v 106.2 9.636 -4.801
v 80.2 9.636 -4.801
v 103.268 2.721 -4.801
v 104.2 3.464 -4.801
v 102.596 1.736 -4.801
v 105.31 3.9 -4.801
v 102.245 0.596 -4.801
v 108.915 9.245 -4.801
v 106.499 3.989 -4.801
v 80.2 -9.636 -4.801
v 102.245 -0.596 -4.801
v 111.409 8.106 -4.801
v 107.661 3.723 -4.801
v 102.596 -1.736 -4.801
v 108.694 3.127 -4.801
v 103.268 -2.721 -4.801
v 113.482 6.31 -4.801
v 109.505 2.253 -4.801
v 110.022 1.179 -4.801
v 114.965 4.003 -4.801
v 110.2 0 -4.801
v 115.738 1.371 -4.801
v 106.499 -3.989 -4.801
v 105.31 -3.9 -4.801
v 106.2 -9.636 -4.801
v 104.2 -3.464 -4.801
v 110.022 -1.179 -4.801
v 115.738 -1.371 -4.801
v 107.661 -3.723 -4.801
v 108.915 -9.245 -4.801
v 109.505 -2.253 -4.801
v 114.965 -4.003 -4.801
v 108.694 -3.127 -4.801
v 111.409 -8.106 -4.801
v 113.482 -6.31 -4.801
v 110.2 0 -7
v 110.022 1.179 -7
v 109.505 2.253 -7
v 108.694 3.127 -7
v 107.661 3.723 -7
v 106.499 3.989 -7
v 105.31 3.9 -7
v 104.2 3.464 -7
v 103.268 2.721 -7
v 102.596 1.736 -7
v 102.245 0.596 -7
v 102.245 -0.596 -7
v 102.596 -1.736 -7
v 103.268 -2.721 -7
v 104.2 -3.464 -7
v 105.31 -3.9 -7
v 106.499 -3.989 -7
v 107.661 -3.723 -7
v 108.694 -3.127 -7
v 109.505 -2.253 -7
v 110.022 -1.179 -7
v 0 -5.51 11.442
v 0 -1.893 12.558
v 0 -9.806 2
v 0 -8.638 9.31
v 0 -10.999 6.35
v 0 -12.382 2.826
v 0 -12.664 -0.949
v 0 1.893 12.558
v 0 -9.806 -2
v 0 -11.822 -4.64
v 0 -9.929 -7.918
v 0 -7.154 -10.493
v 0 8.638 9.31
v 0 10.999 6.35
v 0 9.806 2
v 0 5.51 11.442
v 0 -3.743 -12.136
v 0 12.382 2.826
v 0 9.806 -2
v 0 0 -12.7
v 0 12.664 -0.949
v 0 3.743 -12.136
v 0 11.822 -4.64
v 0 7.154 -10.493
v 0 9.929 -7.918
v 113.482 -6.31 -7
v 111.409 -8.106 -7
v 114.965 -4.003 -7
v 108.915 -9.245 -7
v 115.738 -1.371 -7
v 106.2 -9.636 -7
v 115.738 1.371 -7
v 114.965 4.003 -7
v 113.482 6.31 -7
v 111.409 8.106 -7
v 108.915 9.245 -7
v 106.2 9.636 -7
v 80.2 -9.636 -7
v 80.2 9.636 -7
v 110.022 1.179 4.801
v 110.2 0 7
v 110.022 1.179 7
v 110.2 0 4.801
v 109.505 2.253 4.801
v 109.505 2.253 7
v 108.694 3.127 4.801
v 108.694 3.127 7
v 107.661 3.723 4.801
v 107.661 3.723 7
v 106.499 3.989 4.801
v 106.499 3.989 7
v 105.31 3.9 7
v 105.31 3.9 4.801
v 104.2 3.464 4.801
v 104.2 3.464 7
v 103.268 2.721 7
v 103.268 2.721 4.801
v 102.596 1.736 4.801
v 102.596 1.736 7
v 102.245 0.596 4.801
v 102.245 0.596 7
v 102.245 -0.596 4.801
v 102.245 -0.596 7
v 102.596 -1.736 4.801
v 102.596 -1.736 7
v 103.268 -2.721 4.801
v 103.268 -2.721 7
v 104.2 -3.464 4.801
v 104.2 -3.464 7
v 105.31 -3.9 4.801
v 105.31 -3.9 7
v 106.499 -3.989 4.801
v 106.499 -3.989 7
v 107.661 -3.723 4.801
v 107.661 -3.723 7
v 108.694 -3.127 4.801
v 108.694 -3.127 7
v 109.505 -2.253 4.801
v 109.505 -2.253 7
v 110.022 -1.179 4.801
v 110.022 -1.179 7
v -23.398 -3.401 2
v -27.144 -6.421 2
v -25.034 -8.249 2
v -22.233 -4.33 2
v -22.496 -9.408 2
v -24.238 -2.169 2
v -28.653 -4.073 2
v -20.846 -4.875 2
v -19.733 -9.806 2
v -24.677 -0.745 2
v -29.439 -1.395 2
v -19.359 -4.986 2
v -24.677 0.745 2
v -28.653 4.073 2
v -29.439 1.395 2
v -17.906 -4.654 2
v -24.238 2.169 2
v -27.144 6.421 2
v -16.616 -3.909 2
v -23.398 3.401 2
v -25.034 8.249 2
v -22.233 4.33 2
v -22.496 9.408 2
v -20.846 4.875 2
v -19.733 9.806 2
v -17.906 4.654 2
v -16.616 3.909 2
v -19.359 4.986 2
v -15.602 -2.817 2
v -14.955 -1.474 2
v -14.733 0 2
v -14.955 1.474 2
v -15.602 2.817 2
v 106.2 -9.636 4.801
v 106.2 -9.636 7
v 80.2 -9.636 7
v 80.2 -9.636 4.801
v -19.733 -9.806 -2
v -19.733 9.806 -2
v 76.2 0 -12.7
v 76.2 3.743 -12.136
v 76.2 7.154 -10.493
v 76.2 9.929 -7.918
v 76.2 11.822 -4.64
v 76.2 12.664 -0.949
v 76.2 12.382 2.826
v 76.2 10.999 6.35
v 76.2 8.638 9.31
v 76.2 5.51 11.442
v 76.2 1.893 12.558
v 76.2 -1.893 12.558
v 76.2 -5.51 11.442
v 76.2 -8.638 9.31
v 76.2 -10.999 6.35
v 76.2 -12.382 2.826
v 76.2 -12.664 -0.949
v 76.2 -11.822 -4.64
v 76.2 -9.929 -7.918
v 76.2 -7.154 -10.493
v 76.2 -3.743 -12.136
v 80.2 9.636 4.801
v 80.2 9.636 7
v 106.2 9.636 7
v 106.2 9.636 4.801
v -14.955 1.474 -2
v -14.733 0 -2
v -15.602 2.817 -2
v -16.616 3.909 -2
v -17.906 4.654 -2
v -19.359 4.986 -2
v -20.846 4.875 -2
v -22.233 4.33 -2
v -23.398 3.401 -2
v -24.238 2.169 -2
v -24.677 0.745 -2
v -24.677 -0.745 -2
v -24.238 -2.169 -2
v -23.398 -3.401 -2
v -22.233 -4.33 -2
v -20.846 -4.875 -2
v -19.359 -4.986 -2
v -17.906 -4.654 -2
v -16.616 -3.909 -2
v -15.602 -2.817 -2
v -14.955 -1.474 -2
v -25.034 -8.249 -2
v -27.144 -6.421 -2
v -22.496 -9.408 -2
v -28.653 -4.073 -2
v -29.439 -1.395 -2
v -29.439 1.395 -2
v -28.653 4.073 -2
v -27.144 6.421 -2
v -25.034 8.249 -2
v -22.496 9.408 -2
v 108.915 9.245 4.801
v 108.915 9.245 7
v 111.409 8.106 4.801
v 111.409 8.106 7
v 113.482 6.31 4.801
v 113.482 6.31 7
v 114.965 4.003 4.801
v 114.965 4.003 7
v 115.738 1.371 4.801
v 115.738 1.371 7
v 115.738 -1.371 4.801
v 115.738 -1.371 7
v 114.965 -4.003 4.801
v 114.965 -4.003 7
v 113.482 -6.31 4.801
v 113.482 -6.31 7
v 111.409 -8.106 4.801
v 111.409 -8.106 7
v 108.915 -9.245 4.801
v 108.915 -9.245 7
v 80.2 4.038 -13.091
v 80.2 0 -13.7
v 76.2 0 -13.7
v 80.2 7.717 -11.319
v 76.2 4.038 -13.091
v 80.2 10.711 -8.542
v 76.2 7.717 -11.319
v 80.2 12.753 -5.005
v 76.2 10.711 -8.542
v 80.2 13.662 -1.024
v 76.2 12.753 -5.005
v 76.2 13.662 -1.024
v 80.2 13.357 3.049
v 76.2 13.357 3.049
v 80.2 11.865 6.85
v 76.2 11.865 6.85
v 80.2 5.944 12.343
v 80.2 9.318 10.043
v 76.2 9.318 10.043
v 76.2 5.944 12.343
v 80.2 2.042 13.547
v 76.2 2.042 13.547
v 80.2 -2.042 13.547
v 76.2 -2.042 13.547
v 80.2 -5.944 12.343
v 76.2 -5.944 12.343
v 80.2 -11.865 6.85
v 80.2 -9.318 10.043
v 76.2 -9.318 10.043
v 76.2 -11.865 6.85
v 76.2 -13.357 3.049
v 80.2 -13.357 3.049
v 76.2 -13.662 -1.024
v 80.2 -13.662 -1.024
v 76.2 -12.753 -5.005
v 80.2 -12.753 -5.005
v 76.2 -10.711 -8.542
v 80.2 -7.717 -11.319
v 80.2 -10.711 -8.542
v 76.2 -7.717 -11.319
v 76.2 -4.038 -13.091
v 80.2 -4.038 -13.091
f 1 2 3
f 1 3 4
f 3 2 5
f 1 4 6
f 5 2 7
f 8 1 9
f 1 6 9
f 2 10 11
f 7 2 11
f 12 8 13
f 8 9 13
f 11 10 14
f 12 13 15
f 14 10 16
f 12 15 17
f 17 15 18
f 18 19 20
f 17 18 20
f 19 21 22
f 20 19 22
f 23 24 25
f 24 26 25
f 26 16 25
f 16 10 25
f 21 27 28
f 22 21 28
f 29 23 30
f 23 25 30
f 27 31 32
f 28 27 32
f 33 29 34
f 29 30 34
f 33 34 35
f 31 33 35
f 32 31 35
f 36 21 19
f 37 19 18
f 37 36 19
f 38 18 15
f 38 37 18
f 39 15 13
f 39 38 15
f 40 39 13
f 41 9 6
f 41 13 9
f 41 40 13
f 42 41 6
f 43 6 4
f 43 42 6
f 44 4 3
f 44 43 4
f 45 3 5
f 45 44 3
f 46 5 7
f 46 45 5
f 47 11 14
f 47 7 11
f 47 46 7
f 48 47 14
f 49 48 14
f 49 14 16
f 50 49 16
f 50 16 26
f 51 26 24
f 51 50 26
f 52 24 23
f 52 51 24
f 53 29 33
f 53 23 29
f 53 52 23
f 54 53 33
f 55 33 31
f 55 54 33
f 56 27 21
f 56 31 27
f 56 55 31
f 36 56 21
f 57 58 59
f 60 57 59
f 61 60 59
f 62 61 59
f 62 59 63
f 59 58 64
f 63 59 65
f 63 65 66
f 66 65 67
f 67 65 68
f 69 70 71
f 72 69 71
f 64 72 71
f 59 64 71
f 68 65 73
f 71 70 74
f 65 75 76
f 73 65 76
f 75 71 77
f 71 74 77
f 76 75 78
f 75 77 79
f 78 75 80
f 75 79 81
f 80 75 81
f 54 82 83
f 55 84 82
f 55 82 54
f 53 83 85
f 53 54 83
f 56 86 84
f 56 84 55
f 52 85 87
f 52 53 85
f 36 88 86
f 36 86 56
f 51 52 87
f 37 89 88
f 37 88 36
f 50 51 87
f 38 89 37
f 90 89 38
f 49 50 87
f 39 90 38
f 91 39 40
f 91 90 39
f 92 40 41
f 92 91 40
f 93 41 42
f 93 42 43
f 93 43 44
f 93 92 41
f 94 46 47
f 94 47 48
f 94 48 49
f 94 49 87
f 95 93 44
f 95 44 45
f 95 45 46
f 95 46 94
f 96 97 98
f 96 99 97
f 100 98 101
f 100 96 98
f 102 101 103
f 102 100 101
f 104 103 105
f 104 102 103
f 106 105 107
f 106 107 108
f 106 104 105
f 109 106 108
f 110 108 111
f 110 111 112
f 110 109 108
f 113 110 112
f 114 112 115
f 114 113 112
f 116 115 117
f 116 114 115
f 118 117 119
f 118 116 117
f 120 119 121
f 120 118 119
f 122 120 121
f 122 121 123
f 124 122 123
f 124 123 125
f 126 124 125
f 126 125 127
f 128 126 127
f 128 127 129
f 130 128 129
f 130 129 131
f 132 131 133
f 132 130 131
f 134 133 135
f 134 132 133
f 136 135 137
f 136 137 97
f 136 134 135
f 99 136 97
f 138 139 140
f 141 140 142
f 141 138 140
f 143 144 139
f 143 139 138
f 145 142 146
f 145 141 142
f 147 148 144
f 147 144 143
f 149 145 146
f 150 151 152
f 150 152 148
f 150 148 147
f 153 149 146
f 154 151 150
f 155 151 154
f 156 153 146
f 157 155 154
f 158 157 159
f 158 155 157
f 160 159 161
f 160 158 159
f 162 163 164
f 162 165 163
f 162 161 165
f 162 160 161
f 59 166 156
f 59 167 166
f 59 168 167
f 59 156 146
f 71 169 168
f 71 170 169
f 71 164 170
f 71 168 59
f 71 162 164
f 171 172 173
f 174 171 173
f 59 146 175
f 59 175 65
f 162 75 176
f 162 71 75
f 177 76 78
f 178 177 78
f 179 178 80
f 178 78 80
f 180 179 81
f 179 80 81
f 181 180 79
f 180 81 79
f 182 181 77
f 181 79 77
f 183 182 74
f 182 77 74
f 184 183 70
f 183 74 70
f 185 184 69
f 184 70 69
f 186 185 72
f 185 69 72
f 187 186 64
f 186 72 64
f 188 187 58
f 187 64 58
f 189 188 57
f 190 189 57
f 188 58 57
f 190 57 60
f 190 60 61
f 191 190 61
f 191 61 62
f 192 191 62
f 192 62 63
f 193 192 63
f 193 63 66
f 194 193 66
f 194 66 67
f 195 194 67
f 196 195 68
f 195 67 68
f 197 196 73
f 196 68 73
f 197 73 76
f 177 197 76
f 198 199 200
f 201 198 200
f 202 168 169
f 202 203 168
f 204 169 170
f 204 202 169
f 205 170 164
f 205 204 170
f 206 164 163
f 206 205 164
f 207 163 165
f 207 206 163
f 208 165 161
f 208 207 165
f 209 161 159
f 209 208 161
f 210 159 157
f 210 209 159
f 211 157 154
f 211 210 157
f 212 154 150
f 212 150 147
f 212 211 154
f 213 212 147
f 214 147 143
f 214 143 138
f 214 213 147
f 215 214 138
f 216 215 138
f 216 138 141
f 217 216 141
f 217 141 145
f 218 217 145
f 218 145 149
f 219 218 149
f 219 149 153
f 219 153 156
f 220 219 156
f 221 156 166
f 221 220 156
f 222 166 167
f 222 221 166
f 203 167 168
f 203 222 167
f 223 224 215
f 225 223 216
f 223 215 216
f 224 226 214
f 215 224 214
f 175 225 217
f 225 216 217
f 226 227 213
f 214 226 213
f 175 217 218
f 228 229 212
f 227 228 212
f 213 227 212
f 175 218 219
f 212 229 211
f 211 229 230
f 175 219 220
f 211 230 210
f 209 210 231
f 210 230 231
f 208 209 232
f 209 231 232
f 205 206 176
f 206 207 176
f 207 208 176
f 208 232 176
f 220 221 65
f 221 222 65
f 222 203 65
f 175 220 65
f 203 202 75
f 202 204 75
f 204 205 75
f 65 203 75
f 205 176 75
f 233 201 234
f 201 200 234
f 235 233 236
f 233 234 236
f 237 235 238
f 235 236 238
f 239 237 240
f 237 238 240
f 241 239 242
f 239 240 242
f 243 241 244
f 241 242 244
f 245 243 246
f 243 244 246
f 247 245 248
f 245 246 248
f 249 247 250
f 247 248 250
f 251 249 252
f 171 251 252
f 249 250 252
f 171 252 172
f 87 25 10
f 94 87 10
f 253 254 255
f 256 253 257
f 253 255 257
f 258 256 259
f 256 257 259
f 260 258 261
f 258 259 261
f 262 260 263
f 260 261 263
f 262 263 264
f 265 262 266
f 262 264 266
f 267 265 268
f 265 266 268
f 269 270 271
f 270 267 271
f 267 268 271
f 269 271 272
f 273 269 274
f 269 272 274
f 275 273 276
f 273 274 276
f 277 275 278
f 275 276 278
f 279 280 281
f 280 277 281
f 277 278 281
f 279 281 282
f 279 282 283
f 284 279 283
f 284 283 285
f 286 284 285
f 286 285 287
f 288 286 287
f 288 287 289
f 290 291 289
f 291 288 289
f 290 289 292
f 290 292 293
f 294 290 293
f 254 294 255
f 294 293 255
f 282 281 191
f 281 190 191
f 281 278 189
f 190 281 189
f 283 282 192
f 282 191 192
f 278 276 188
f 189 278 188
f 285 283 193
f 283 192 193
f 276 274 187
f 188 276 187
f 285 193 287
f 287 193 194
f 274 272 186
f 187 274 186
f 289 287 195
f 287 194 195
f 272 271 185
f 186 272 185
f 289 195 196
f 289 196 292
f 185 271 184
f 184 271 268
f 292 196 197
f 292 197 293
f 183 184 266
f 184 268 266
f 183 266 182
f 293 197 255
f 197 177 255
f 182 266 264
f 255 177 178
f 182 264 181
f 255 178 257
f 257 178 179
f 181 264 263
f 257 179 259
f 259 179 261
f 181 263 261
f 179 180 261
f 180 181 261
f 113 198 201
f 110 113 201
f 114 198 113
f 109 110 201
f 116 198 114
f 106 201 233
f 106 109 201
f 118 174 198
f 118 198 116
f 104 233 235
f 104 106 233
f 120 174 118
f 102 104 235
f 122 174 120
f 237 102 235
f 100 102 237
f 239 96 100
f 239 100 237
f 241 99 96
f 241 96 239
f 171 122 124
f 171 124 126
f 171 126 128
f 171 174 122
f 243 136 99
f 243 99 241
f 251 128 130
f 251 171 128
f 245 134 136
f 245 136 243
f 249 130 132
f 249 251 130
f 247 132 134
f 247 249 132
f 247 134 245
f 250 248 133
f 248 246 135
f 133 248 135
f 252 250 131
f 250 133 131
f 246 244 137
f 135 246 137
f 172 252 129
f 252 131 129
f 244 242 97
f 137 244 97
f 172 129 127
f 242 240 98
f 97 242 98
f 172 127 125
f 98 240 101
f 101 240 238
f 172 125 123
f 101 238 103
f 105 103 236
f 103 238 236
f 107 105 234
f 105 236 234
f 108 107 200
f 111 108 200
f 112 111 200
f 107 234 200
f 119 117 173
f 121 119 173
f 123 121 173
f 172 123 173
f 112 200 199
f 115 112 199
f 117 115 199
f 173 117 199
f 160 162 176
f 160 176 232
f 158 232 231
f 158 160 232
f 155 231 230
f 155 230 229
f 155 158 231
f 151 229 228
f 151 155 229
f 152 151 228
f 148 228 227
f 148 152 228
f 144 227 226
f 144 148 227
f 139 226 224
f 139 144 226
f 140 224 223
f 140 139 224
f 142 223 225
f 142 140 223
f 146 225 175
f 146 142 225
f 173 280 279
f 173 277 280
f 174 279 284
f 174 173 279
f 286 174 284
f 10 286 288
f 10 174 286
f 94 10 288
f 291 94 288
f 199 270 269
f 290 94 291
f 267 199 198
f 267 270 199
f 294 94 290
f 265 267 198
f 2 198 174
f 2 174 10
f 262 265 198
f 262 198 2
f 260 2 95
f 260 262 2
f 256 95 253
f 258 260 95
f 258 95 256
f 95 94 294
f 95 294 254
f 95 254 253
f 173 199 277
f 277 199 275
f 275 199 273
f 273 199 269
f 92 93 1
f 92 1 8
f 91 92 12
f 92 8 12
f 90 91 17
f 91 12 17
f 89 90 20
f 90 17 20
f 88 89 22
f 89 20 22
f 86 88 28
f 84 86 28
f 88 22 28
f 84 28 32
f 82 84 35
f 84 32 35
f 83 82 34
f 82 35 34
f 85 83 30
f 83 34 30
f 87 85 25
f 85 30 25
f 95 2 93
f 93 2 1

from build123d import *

# Parameters (mm, degrees)
SKETCH1_R               = 12.7
EXTRUDE1_DEPTH          = 76.2
SKETCH2_R               = 5
EXTRUDE2_DEPTH          = 2
SKETCH3_R               = 13.7
EXTRUDE3_DEPTH          = 4
SKETCH4_R               = 4
EXTRUDE4_DEPTH          = 7
SKETCH5_W               = 279.527972269
SKETCH5_H               = 9.602426348
CUT_EXTRUDE1_DEPTH      = 14.7
CUT_EXTRUDE1_DEPTH_BACK = 14.7


with BuildPart() as part:
    # Sketch1 → Extrude1 (new body)
    with BuildSketch(Plane(origin=(0, 0, 0), x_dir=(0, 0, -1), z_dir=(1, 0, 0))):
        Circle(SKETCH1_R)
    extrude(amount=EXTRUDE1_DEPTH)

    # Sketch2 → Extrude2 (add, symmetric)
    with BuildSketch(Plane.XY):
        with BuildLine():
            Line((0, 9.805687548), (-19.733094472, 9.805687548))
            ThreePointArc((-19.733094472, 9.805687548), (-29.53878202, 0), (-19.733094472, -9.805687548))
            Line((-19.733094472, -9.805687548), (0, -9.805687548))
            Line((0, -9.805687548), (0, 9.805687548))
        make_face()
        with Locations((-19.733094472, 0)):
            Circle(SKETCH2_R, mode=Mode.SUBTRACT)
    extrude(amount=EXTRUDE2_DEPTH, both=True)

    # Sketch3 → Extrude3 (add)
    with BuildSketch(Plane(origin=(76.2, 0, 0), x_dir=(0, 0, -1), z_dir=(1, 0, 0))):
        Circle(SKETCH3_R)
    extrude(amount=EXTRUDE3_DEPTH)

    # Sketch4 → Extrude4 (add, symmetric)
    with BuildSketch(Plane.XY):
        with BuildLine():
            Line((80.2, 9.635666442), (106.2, 9.635666442))
            ThreePointArc((106.2, 9.635666442), (115.835666442, 0), (106.2, -9.635666442))
            Line((106.2, -9.635666442), (80.2, -9.635666442))
            Line((80.2, -9.635666442), (80.2, 9.635666442))
        make_face()
        with Locations((106.2, 0)):
            Circle(SKETCH4_R, mode=Mode.SUBTRACT)
    extrude(amount=EXTRUDE4_DEPTH, both=True)

    # Sketch5 → Cut-Extrude1 (cut, two sides)
    with BuildSketch(Plane(origin=(0, 0, 0), x_dir=(1, 0, 0), z_dir=(0, 1, 0))) as cut_extrude1_sk:
        with Locations((219.963986135, 0)):
            Rectangle(SKETCH5_W, SKETCH5_H)
    extrude(amount=CUT_EXTRUDE1_DEPTH, mode=Mode.SUBTRACT)
    extrude(cut_extrude1_sk.sketch, amount=-CUT_EXTRUDE1_DEPTH_BACK, mode=Mode.SUBTRACT)


solid = part.part
